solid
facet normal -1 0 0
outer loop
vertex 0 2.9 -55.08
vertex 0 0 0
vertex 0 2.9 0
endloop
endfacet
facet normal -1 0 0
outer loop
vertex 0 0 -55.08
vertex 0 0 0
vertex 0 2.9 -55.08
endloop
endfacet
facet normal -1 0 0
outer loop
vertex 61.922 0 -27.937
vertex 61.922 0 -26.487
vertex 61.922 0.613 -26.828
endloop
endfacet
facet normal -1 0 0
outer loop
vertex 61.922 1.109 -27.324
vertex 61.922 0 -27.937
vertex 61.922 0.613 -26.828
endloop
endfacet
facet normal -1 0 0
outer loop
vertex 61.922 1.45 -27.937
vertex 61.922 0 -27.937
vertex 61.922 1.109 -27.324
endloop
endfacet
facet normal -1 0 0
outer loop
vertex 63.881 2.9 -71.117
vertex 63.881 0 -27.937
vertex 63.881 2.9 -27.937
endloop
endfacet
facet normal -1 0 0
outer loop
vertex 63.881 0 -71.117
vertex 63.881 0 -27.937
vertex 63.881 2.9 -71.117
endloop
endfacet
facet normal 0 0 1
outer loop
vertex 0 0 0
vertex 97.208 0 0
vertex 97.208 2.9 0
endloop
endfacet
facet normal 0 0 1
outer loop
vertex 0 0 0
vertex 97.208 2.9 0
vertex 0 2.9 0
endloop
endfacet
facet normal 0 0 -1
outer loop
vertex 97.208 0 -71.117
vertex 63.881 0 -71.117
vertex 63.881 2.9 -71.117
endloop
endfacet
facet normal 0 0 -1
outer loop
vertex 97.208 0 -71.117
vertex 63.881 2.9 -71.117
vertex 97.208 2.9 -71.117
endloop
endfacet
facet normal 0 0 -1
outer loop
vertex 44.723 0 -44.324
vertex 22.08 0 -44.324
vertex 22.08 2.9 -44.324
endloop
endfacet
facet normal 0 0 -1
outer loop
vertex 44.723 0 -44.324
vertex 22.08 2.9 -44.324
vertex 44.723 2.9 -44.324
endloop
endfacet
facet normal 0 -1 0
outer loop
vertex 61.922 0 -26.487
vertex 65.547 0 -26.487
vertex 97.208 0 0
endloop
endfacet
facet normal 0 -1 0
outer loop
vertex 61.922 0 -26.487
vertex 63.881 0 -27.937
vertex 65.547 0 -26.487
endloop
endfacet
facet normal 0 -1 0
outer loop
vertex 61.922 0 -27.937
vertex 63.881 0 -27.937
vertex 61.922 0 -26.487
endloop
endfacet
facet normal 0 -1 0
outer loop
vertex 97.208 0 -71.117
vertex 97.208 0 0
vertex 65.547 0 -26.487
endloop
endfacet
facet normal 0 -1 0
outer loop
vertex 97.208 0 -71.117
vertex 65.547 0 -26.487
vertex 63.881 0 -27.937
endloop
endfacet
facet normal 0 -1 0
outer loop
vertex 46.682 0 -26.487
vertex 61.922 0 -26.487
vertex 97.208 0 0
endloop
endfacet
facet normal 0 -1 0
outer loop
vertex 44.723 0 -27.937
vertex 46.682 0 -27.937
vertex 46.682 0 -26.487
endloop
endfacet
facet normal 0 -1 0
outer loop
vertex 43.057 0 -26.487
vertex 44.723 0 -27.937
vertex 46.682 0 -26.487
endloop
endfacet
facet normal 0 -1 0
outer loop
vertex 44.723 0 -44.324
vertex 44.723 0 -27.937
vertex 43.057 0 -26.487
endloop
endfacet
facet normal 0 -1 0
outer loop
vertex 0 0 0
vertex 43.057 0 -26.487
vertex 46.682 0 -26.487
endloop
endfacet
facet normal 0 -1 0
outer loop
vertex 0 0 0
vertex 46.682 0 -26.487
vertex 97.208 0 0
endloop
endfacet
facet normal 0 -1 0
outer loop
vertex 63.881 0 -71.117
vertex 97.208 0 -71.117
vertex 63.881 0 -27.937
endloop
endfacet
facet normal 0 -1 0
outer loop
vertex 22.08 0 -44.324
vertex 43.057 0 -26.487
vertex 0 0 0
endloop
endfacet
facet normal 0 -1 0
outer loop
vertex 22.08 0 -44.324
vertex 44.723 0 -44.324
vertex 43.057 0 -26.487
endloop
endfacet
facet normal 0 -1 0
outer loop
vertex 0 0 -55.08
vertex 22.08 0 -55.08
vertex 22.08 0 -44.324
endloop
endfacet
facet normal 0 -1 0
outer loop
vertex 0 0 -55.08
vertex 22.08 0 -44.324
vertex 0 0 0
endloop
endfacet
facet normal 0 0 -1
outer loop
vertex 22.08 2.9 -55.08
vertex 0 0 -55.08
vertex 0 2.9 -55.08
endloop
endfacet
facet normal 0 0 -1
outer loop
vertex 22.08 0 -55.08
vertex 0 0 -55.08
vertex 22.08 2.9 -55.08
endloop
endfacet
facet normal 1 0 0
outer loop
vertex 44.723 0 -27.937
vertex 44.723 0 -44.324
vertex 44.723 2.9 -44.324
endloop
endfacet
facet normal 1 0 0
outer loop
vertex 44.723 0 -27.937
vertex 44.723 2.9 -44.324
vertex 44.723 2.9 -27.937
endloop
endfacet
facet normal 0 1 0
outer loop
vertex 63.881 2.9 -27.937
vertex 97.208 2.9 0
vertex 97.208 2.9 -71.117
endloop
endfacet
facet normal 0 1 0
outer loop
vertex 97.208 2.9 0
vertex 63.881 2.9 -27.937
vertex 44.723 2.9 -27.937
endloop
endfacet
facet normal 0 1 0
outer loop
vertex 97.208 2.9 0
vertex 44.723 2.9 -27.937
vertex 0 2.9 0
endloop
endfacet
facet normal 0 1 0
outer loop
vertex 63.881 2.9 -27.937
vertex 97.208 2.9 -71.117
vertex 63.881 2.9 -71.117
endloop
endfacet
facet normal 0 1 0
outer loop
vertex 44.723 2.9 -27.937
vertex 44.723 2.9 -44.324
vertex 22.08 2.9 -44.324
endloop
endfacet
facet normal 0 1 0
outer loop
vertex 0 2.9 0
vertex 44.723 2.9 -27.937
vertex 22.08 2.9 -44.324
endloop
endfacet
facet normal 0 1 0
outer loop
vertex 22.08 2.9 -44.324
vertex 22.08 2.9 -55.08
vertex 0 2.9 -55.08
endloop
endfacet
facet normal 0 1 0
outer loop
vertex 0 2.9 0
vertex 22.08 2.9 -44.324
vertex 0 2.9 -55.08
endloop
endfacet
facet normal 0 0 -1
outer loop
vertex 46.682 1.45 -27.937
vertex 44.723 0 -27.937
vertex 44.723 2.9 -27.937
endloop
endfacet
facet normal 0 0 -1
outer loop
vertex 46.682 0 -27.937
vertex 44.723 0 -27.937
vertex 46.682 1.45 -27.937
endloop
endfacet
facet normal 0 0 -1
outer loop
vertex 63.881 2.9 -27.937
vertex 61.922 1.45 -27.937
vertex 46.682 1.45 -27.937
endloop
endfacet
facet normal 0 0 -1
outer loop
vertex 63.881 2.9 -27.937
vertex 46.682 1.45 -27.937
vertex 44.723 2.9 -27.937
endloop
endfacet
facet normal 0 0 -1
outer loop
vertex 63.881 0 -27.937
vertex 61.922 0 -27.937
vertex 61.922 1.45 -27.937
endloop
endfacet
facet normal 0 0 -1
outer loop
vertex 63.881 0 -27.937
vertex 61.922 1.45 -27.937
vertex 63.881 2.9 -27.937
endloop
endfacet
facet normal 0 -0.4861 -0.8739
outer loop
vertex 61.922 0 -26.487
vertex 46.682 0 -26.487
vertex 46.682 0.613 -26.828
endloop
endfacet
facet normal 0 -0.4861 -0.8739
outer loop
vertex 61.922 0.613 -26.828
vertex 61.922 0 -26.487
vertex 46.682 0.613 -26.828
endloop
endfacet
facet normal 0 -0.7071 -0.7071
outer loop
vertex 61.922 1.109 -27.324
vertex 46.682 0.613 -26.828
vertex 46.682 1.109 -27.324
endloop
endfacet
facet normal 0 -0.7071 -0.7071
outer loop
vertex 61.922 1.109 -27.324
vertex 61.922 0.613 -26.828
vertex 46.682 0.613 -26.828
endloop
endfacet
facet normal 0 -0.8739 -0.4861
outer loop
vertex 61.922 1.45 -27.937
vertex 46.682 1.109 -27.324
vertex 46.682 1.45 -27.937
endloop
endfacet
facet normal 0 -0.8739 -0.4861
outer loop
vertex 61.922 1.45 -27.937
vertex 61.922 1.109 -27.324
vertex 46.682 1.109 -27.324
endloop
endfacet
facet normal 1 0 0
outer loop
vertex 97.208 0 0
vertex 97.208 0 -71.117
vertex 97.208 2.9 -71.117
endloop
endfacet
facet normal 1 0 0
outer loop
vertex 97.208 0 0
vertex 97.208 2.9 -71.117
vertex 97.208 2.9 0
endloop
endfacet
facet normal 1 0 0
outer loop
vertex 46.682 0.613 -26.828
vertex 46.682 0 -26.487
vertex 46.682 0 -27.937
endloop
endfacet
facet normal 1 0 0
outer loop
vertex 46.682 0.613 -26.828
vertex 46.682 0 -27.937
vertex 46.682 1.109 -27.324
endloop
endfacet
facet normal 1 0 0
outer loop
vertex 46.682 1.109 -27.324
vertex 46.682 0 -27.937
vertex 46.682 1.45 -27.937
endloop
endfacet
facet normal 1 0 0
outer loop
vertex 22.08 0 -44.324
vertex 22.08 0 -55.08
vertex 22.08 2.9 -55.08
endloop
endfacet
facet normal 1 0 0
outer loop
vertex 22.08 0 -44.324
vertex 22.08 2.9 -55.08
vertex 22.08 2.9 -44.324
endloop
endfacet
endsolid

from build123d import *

# Parameters (mm, degrees)
BOSS_EXTRUDE1_DEPTH = 2.9
SKETCH2_W           = 15.24
SKETCH2_H           = 1.45
CUT_EXTRUDE1_DEPTH  = 1.45
FILLET2_R           = 2.54


with BuildPart() as part:
    # Sketch1 → Boss-Extrude1 (new body)
    with BuildSketch(Plane(origin=(0, 0, 0), x_dir=(1, 0, 0), z_dir=(0, 1, 0))):
        Polygon((0, 0), (0, 55.080000076), (22.080000036, 55.080000076), (22.080000036, 44.32387376), (44.723008852, 44.32387376), (44.723008852, 27.937097796), (63.88136576, 27.937097796), (63.88136576, 71.117097796), (97.207622704, 71.117097796), (97.207622704, 0), align=None)
    extrude(amount=BOSS_EXTRUDE1_DEPTH)

    # Sketch2 → Cut-Extrude1 (cut)
    with BuildSketch(Plane(origin=(0, 0, -27.937097796), x_dir=(-1, 0, 0), z_dir=(0, 0, -1))):
        with Locations((-54.302187306, 0.725)):
            Rectangle(SKETCH2_W, SKETCH2_H)
    extrude(amount=-CUT_EXTRUDE1_DEPTH, mode=Mode.SUBTRACT)

    # Fillet2
    # the kernel refuses this fillet: 2.54 mm, written as the material it adds along each edge
    with BuildSketch(Plane(origin=(65.547187306, 1.45, -26.487097796), x_dir=(0, -1, 0), z_dir=(-1, 0, 0))) as fillet2_piece_1:
        with BuildLine():
            CenterArc((2.368220922, -2.368220922), FILLET2_R, 111.192609021, 47.614781958)
            Line((0, -1.45), (0, 0))
            Line((0, 0), (1.45, 0))
        make_face()
    extrude(amount=22.49)


solid = part.part
